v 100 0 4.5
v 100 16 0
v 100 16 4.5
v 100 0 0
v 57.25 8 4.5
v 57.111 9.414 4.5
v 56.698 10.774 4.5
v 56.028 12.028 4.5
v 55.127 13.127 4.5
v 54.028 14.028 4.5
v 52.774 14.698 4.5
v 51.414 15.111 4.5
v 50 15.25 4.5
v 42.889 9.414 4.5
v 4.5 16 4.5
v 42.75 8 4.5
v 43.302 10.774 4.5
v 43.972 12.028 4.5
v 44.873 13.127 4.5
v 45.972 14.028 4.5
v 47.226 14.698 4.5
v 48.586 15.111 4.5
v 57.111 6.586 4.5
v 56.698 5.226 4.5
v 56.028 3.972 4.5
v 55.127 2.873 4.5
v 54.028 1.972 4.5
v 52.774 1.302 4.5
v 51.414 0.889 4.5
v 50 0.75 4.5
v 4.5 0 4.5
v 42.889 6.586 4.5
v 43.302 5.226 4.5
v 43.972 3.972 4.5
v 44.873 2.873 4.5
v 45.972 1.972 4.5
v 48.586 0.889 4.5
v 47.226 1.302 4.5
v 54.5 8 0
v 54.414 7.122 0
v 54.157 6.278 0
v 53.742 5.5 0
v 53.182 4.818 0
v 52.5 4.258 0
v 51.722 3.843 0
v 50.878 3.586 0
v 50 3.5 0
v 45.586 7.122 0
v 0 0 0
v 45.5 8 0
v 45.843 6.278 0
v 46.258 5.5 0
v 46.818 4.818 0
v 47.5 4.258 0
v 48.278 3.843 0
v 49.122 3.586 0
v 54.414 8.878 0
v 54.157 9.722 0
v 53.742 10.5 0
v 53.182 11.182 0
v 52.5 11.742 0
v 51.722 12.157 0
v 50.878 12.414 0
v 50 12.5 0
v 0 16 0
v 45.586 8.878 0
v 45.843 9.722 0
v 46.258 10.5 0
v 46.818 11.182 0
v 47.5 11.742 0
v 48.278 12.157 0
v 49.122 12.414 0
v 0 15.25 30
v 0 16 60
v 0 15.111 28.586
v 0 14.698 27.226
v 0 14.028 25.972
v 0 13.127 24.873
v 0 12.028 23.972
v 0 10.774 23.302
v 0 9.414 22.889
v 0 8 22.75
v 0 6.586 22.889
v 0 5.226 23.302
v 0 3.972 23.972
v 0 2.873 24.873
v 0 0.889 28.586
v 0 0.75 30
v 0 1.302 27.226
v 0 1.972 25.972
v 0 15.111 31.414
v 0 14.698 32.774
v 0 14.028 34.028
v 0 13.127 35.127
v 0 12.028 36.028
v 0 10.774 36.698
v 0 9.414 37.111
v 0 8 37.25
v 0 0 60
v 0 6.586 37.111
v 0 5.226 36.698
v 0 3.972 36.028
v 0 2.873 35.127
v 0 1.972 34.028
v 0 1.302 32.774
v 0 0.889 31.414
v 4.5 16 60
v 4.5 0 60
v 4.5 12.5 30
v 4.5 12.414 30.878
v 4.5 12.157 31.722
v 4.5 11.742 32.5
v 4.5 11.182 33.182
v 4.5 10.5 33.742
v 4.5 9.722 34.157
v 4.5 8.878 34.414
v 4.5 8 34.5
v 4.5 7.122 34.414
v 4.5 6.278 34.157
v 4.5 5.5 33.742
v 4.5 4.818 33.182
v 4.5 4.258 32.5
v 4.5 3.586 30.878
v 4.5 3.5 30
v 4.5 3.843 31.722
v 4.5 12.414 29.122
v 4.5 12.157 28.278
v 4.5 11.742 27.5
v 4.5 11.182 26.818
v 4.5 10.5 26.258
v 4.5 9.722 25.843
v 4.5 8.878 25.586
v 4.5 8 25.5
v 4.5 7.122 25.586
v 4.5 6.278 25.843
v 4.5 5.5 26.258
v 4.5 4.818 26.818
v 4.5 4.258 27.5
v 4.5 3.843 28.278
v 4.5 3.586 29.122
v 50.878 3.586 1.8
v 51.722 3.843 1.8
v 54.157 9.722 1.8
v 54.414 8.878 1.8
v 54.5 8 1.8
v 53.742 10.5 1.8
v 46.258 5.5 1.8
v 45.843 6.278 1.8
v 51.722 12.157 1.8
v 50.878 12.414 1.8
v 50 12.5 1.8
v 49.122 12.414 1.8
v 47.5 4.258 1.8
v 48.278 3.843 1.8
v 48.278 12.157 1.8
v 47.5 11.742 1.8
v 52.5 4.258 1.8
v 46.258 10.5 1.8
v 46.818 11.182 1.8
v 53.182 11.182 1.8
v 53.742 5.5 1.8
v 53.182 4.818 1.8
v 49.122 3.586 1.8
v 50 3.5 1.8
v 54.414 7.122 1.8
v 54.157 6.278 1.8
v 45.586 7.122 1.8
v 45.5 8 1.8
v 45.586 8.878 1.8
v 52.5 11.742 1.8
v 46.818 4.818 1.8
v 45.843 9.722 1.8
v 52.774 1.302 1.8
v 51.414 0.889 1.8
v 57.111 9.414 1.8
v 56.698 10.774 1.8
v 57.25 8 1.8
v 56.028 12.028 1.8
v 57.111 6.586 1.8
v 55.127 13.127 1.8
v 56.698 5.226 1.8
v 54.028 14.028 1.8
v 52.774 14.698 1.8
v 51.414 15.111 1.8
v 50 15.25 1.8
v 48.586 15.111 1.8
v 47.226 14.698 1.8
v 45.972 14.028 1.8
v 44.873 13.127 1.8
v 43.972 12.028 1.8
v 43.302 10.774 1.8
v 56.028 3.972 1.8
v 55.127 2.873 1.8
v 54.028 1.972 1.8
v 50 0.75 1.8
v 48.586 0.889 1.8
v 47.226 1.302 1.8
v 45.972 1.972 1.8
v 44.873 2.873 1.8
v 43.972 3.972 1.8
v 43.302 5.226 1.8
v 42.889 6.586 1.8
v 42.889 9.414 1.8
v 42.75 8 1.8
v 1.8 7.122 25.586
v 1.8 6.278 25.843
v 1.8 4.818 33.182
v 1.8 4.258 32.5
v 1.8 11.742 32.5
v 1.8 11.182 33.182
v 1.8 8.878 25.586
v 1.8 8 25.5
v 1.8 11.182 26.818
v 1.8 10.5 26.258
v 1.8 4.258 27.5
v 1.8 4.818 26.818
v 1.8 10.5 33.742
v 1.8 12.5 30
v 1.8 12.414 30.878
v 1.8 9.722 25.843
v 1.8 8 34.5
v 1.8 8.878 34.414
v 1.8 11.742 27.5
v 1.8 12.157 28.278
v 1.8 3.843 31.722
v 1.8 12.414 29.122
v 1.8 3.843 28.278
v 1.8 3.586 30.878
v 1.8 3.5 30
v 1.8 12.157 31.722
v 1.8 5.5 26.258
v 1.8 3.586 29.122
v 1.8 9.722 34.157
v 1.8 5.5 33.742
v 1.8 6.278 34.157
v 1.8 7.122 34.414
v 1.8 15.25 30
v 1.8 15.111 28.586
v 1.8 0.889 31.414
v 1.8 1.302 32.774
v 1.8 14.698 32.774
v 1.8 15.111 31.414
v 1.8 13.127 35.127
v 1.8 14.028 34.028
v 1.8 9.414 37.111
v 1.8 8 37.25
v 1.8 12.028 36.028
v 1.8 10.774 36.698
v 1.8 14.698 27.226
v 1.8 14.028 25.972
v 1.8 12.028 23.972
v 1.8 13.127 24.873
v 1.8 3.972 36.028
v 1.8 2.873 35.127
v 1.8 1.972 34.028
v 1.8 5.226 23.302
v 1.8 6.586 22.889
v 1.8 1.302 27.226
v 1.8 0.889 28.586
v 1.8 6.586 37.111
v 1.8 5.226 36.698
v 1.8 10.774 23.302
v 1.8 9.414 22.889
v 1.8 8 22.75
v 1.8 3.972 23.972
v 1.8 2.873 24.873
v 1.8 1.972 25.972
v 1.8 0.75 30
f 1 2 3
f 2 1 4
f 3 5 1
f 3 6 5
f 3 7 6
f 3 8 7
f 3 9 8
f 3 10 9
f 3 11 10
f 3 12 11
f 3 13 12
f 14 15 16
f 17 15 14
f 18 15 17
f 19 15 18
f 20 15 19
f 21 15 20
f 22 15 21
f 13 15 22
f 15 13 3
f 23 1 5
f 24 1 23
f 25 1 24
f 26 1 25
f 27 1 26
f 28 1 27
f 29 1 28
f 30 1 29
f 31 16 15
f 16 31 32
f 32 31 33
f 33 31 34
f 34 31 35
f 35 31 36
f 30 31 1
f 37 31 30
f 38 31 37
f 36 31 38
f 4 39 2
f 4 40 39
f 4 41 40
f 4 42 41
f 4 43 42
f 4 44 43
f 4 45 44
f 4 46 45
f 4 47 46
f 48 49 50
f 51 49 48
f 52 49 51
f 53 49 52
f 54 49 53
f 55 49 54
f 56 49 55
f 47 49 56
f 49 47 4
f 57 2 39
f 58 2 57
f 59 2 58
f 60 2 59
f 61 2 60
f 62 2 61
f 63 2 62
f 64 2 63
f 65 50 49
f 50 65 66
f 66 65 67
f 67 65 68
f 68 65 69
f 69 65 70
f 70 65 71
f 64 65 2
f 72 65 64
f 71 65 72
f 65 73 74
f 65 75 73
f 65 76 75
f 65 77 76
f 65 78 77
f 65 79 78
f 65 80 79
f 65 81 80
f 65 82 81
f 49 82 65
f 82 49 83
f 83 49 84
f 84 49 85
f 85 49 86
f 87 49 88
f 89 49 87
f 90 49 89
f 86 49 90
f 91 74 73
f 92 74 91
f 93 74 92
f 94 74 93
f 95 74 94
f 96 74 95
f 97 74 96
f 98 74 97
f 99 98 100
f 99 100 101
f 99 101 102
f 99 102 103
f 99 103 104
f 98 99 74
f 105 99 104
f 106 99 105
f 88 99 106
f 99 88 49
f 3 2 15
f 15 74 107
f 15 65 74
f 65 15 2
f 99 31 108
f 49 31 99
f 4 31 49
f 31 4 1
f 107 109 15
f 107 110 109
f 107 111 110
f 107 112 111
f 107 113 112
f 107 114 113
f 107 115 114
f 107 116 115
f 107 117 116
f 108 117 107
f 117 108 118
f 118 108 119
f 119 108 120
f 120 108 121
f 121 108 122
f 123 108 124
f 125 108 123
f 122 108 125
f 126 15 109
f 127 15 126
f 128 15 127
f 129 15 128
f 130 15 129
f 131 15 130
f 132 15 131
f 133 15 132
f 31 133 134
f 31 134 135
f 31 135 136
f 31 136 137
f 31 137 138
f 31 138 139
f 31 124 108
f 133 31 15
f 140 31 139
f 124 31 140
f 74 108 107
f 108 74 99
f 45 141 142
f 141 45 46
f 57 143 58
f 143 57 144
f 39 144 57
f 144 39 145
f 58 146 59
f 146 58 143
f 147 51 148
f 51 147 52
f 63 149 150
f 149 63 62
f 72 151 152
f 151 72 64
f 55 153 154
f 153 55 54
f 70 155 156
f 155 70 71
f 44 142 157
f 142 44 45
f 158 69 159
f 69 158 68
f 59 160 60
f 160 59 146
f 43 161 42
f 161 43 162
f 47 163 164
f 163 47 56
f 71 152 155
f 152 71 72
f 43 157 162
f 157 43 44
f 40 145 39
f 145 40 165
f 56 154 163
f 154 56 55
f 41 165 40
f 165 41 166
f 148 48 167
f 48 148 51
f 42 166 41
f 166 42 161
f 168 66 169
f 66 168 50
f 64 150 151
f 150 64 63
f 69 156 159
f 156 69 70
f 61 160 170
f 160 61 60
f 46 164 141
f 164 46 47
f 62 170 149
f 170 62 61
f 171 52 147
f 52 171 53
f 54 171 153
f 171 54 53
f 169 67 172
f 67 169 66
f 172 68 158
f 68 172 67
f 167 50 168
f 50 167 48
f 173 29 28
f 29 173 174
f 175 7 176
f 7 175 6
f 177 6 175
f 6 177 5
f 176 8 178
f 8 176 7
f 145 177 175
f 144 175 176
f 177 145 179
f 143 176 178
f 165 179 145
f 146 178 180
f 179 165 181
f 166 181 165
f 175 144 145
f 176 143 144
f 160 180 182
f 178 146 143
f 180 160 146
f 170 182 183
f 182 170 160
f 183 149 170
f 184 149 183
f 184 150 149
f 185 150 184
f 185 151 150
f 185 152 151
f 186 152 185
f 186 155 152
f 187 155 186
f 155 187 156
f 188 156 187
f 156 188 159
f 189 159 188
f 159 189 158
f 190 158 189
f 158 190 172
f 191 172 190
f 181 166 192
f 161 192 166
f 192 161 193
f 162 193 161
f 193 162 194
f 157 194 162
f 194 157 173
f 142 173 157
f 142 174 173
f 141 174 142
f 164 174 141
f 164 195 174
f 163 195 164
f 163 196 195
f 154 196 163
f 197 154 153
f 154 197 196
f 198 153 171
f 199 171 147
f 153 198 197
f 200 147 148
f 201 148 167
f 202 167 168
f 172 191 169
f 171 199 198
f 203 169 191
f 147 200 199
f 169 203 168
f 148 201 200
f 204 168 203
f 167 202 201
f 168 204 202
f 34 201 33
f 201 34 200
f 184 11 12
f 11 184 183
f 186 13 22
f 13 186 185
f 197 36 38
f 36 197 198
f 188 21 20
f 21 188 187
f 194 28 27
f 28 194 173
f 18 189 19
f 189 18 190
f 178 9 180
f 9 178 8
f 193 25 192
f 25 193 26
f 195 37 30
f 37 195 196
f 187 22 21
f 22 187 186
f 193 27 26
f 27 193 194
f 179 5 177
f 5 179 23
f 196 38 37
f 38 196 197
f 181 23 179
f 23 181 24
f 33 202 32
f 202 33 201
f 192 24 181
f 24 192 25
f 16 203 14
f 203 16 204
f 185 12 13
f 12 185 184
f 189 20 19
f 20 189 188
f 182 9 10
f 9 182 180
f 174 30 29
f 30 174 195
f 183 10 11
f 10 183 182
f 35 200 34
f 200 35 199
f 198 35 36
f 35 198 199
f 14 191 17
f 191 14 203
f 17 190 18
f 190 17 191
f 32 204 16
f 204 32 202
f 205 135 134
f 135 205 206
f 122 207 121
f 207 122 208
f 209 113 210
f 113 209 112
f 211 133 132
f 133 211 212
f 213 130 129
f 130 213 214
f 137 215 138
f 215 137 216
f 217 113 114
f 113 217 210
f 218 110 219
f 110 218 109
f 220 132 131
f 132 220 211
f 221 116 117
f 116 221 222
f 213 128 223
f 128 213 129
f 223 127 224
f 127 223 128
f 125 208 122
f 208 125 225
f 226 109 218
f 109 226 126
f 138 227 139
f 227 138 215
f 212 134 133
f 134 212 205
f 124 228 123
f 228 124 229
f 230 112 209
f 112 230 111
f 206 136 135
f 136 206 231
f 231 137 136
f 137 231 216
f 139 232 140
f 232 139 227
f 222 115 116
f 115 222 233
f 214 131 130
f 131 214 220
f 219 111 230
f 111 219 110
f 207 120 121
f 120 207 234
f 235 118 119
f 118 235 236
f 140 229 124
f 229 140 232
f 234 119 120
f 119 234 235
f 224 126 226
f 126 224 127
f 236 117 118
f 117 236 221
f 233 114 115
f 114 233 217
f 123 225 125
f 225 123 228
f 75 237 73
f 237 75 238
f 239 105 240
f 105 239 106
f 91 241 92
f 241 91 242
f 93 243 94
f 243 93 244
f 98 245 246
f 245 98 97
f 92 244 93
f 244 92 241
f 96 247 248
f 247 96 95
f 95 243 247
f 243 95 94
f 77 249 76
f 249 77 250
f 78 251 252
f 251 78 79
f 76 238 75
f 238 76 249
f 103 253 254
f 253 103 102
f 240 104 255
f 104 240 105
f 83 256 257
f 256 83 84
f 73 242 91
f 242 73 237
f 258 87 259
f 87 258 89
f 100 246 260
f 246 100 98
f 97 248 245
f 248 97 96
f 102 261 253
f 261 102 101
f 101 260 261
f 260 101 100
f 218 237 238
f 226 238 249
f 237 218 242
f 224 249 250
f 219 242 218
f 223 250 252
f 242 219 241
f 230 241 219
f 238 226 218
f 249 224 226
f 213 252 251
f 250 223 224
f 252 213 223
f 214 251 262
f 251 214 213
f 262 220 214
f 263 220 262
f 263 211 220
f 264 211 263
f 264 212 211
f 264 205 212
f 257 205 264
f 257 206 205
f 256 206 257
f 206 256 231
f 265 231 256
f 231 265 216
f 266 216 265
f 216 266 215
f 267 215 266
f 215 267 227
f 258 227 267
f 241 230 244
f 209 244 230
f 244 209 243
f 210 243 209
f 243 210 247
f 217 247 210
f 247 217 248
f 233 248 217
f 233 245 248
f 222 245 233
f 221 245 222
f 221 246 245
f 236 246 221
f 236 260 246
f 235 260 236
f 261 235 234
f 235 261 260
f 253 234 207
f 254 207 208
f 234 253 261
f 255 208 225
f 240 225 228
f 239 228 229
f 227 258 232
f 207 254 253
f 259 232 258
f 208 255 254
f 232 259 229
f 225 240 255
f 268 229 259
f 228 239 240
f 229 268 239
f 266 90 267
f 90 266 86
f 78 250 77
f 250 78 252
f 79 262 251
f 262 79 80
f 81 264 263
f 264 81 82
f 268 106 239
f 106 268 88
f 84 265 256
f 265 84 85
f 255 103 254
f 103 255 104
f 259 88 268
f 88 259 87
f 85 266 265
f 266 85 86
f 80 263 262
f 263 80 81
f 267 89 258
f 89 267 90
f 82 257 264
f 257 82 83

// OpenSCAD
$fn = 32;

// ----------------------------------------------------------------------
// L-bracket: 100 x 16 x 60 mm
// ----------------------------------------------------------------------

// --- parameters (mm) ---
arm_x = 100;              // horizontal leg, X
arm_z = 60;               // vertical leg, Z
width = 16;               // bracket depth, Y
wall = 4.5;               // plate thickness
hole_d = 9;               // clearance for M8
cb_d = 14.5;              // counterbore seat
cb_h = 2.7;               // counterbore depth

module hole_z(px, py) {
  translate([px, py, -2.5]) cylinder(h = wall + 5, d = hole_d);
}
module hole_x(pz, py) {
  translate([-2.5, py, pz]) rotate([0, 90, 0]) cylinder(h = wall + 5, d = hole_d);
}
module cb_z(px, py) {
  translate([px, py, wall - cb_h]) cylinder(h = cb_h + 0.4, d = cb_d);
}
module cb_x(pz, py) {
  translate([wall - cb_h, py, pz]) rotate([0, -90, 0]) cylinder(h = cb_h + 0.4, d = cb_d);
}

difference() {
  union() {
    /* horizontal leg */
    cube([arm_x, width, wall]);
    /* vertical leg, overlapping the corner block */
    cube([wall, width, arm_z]);
  }
  hole_z(50, 8);
  cb_z(50, 8);
  hole_x(30, 8);
  cb_x(30, 8);
}
